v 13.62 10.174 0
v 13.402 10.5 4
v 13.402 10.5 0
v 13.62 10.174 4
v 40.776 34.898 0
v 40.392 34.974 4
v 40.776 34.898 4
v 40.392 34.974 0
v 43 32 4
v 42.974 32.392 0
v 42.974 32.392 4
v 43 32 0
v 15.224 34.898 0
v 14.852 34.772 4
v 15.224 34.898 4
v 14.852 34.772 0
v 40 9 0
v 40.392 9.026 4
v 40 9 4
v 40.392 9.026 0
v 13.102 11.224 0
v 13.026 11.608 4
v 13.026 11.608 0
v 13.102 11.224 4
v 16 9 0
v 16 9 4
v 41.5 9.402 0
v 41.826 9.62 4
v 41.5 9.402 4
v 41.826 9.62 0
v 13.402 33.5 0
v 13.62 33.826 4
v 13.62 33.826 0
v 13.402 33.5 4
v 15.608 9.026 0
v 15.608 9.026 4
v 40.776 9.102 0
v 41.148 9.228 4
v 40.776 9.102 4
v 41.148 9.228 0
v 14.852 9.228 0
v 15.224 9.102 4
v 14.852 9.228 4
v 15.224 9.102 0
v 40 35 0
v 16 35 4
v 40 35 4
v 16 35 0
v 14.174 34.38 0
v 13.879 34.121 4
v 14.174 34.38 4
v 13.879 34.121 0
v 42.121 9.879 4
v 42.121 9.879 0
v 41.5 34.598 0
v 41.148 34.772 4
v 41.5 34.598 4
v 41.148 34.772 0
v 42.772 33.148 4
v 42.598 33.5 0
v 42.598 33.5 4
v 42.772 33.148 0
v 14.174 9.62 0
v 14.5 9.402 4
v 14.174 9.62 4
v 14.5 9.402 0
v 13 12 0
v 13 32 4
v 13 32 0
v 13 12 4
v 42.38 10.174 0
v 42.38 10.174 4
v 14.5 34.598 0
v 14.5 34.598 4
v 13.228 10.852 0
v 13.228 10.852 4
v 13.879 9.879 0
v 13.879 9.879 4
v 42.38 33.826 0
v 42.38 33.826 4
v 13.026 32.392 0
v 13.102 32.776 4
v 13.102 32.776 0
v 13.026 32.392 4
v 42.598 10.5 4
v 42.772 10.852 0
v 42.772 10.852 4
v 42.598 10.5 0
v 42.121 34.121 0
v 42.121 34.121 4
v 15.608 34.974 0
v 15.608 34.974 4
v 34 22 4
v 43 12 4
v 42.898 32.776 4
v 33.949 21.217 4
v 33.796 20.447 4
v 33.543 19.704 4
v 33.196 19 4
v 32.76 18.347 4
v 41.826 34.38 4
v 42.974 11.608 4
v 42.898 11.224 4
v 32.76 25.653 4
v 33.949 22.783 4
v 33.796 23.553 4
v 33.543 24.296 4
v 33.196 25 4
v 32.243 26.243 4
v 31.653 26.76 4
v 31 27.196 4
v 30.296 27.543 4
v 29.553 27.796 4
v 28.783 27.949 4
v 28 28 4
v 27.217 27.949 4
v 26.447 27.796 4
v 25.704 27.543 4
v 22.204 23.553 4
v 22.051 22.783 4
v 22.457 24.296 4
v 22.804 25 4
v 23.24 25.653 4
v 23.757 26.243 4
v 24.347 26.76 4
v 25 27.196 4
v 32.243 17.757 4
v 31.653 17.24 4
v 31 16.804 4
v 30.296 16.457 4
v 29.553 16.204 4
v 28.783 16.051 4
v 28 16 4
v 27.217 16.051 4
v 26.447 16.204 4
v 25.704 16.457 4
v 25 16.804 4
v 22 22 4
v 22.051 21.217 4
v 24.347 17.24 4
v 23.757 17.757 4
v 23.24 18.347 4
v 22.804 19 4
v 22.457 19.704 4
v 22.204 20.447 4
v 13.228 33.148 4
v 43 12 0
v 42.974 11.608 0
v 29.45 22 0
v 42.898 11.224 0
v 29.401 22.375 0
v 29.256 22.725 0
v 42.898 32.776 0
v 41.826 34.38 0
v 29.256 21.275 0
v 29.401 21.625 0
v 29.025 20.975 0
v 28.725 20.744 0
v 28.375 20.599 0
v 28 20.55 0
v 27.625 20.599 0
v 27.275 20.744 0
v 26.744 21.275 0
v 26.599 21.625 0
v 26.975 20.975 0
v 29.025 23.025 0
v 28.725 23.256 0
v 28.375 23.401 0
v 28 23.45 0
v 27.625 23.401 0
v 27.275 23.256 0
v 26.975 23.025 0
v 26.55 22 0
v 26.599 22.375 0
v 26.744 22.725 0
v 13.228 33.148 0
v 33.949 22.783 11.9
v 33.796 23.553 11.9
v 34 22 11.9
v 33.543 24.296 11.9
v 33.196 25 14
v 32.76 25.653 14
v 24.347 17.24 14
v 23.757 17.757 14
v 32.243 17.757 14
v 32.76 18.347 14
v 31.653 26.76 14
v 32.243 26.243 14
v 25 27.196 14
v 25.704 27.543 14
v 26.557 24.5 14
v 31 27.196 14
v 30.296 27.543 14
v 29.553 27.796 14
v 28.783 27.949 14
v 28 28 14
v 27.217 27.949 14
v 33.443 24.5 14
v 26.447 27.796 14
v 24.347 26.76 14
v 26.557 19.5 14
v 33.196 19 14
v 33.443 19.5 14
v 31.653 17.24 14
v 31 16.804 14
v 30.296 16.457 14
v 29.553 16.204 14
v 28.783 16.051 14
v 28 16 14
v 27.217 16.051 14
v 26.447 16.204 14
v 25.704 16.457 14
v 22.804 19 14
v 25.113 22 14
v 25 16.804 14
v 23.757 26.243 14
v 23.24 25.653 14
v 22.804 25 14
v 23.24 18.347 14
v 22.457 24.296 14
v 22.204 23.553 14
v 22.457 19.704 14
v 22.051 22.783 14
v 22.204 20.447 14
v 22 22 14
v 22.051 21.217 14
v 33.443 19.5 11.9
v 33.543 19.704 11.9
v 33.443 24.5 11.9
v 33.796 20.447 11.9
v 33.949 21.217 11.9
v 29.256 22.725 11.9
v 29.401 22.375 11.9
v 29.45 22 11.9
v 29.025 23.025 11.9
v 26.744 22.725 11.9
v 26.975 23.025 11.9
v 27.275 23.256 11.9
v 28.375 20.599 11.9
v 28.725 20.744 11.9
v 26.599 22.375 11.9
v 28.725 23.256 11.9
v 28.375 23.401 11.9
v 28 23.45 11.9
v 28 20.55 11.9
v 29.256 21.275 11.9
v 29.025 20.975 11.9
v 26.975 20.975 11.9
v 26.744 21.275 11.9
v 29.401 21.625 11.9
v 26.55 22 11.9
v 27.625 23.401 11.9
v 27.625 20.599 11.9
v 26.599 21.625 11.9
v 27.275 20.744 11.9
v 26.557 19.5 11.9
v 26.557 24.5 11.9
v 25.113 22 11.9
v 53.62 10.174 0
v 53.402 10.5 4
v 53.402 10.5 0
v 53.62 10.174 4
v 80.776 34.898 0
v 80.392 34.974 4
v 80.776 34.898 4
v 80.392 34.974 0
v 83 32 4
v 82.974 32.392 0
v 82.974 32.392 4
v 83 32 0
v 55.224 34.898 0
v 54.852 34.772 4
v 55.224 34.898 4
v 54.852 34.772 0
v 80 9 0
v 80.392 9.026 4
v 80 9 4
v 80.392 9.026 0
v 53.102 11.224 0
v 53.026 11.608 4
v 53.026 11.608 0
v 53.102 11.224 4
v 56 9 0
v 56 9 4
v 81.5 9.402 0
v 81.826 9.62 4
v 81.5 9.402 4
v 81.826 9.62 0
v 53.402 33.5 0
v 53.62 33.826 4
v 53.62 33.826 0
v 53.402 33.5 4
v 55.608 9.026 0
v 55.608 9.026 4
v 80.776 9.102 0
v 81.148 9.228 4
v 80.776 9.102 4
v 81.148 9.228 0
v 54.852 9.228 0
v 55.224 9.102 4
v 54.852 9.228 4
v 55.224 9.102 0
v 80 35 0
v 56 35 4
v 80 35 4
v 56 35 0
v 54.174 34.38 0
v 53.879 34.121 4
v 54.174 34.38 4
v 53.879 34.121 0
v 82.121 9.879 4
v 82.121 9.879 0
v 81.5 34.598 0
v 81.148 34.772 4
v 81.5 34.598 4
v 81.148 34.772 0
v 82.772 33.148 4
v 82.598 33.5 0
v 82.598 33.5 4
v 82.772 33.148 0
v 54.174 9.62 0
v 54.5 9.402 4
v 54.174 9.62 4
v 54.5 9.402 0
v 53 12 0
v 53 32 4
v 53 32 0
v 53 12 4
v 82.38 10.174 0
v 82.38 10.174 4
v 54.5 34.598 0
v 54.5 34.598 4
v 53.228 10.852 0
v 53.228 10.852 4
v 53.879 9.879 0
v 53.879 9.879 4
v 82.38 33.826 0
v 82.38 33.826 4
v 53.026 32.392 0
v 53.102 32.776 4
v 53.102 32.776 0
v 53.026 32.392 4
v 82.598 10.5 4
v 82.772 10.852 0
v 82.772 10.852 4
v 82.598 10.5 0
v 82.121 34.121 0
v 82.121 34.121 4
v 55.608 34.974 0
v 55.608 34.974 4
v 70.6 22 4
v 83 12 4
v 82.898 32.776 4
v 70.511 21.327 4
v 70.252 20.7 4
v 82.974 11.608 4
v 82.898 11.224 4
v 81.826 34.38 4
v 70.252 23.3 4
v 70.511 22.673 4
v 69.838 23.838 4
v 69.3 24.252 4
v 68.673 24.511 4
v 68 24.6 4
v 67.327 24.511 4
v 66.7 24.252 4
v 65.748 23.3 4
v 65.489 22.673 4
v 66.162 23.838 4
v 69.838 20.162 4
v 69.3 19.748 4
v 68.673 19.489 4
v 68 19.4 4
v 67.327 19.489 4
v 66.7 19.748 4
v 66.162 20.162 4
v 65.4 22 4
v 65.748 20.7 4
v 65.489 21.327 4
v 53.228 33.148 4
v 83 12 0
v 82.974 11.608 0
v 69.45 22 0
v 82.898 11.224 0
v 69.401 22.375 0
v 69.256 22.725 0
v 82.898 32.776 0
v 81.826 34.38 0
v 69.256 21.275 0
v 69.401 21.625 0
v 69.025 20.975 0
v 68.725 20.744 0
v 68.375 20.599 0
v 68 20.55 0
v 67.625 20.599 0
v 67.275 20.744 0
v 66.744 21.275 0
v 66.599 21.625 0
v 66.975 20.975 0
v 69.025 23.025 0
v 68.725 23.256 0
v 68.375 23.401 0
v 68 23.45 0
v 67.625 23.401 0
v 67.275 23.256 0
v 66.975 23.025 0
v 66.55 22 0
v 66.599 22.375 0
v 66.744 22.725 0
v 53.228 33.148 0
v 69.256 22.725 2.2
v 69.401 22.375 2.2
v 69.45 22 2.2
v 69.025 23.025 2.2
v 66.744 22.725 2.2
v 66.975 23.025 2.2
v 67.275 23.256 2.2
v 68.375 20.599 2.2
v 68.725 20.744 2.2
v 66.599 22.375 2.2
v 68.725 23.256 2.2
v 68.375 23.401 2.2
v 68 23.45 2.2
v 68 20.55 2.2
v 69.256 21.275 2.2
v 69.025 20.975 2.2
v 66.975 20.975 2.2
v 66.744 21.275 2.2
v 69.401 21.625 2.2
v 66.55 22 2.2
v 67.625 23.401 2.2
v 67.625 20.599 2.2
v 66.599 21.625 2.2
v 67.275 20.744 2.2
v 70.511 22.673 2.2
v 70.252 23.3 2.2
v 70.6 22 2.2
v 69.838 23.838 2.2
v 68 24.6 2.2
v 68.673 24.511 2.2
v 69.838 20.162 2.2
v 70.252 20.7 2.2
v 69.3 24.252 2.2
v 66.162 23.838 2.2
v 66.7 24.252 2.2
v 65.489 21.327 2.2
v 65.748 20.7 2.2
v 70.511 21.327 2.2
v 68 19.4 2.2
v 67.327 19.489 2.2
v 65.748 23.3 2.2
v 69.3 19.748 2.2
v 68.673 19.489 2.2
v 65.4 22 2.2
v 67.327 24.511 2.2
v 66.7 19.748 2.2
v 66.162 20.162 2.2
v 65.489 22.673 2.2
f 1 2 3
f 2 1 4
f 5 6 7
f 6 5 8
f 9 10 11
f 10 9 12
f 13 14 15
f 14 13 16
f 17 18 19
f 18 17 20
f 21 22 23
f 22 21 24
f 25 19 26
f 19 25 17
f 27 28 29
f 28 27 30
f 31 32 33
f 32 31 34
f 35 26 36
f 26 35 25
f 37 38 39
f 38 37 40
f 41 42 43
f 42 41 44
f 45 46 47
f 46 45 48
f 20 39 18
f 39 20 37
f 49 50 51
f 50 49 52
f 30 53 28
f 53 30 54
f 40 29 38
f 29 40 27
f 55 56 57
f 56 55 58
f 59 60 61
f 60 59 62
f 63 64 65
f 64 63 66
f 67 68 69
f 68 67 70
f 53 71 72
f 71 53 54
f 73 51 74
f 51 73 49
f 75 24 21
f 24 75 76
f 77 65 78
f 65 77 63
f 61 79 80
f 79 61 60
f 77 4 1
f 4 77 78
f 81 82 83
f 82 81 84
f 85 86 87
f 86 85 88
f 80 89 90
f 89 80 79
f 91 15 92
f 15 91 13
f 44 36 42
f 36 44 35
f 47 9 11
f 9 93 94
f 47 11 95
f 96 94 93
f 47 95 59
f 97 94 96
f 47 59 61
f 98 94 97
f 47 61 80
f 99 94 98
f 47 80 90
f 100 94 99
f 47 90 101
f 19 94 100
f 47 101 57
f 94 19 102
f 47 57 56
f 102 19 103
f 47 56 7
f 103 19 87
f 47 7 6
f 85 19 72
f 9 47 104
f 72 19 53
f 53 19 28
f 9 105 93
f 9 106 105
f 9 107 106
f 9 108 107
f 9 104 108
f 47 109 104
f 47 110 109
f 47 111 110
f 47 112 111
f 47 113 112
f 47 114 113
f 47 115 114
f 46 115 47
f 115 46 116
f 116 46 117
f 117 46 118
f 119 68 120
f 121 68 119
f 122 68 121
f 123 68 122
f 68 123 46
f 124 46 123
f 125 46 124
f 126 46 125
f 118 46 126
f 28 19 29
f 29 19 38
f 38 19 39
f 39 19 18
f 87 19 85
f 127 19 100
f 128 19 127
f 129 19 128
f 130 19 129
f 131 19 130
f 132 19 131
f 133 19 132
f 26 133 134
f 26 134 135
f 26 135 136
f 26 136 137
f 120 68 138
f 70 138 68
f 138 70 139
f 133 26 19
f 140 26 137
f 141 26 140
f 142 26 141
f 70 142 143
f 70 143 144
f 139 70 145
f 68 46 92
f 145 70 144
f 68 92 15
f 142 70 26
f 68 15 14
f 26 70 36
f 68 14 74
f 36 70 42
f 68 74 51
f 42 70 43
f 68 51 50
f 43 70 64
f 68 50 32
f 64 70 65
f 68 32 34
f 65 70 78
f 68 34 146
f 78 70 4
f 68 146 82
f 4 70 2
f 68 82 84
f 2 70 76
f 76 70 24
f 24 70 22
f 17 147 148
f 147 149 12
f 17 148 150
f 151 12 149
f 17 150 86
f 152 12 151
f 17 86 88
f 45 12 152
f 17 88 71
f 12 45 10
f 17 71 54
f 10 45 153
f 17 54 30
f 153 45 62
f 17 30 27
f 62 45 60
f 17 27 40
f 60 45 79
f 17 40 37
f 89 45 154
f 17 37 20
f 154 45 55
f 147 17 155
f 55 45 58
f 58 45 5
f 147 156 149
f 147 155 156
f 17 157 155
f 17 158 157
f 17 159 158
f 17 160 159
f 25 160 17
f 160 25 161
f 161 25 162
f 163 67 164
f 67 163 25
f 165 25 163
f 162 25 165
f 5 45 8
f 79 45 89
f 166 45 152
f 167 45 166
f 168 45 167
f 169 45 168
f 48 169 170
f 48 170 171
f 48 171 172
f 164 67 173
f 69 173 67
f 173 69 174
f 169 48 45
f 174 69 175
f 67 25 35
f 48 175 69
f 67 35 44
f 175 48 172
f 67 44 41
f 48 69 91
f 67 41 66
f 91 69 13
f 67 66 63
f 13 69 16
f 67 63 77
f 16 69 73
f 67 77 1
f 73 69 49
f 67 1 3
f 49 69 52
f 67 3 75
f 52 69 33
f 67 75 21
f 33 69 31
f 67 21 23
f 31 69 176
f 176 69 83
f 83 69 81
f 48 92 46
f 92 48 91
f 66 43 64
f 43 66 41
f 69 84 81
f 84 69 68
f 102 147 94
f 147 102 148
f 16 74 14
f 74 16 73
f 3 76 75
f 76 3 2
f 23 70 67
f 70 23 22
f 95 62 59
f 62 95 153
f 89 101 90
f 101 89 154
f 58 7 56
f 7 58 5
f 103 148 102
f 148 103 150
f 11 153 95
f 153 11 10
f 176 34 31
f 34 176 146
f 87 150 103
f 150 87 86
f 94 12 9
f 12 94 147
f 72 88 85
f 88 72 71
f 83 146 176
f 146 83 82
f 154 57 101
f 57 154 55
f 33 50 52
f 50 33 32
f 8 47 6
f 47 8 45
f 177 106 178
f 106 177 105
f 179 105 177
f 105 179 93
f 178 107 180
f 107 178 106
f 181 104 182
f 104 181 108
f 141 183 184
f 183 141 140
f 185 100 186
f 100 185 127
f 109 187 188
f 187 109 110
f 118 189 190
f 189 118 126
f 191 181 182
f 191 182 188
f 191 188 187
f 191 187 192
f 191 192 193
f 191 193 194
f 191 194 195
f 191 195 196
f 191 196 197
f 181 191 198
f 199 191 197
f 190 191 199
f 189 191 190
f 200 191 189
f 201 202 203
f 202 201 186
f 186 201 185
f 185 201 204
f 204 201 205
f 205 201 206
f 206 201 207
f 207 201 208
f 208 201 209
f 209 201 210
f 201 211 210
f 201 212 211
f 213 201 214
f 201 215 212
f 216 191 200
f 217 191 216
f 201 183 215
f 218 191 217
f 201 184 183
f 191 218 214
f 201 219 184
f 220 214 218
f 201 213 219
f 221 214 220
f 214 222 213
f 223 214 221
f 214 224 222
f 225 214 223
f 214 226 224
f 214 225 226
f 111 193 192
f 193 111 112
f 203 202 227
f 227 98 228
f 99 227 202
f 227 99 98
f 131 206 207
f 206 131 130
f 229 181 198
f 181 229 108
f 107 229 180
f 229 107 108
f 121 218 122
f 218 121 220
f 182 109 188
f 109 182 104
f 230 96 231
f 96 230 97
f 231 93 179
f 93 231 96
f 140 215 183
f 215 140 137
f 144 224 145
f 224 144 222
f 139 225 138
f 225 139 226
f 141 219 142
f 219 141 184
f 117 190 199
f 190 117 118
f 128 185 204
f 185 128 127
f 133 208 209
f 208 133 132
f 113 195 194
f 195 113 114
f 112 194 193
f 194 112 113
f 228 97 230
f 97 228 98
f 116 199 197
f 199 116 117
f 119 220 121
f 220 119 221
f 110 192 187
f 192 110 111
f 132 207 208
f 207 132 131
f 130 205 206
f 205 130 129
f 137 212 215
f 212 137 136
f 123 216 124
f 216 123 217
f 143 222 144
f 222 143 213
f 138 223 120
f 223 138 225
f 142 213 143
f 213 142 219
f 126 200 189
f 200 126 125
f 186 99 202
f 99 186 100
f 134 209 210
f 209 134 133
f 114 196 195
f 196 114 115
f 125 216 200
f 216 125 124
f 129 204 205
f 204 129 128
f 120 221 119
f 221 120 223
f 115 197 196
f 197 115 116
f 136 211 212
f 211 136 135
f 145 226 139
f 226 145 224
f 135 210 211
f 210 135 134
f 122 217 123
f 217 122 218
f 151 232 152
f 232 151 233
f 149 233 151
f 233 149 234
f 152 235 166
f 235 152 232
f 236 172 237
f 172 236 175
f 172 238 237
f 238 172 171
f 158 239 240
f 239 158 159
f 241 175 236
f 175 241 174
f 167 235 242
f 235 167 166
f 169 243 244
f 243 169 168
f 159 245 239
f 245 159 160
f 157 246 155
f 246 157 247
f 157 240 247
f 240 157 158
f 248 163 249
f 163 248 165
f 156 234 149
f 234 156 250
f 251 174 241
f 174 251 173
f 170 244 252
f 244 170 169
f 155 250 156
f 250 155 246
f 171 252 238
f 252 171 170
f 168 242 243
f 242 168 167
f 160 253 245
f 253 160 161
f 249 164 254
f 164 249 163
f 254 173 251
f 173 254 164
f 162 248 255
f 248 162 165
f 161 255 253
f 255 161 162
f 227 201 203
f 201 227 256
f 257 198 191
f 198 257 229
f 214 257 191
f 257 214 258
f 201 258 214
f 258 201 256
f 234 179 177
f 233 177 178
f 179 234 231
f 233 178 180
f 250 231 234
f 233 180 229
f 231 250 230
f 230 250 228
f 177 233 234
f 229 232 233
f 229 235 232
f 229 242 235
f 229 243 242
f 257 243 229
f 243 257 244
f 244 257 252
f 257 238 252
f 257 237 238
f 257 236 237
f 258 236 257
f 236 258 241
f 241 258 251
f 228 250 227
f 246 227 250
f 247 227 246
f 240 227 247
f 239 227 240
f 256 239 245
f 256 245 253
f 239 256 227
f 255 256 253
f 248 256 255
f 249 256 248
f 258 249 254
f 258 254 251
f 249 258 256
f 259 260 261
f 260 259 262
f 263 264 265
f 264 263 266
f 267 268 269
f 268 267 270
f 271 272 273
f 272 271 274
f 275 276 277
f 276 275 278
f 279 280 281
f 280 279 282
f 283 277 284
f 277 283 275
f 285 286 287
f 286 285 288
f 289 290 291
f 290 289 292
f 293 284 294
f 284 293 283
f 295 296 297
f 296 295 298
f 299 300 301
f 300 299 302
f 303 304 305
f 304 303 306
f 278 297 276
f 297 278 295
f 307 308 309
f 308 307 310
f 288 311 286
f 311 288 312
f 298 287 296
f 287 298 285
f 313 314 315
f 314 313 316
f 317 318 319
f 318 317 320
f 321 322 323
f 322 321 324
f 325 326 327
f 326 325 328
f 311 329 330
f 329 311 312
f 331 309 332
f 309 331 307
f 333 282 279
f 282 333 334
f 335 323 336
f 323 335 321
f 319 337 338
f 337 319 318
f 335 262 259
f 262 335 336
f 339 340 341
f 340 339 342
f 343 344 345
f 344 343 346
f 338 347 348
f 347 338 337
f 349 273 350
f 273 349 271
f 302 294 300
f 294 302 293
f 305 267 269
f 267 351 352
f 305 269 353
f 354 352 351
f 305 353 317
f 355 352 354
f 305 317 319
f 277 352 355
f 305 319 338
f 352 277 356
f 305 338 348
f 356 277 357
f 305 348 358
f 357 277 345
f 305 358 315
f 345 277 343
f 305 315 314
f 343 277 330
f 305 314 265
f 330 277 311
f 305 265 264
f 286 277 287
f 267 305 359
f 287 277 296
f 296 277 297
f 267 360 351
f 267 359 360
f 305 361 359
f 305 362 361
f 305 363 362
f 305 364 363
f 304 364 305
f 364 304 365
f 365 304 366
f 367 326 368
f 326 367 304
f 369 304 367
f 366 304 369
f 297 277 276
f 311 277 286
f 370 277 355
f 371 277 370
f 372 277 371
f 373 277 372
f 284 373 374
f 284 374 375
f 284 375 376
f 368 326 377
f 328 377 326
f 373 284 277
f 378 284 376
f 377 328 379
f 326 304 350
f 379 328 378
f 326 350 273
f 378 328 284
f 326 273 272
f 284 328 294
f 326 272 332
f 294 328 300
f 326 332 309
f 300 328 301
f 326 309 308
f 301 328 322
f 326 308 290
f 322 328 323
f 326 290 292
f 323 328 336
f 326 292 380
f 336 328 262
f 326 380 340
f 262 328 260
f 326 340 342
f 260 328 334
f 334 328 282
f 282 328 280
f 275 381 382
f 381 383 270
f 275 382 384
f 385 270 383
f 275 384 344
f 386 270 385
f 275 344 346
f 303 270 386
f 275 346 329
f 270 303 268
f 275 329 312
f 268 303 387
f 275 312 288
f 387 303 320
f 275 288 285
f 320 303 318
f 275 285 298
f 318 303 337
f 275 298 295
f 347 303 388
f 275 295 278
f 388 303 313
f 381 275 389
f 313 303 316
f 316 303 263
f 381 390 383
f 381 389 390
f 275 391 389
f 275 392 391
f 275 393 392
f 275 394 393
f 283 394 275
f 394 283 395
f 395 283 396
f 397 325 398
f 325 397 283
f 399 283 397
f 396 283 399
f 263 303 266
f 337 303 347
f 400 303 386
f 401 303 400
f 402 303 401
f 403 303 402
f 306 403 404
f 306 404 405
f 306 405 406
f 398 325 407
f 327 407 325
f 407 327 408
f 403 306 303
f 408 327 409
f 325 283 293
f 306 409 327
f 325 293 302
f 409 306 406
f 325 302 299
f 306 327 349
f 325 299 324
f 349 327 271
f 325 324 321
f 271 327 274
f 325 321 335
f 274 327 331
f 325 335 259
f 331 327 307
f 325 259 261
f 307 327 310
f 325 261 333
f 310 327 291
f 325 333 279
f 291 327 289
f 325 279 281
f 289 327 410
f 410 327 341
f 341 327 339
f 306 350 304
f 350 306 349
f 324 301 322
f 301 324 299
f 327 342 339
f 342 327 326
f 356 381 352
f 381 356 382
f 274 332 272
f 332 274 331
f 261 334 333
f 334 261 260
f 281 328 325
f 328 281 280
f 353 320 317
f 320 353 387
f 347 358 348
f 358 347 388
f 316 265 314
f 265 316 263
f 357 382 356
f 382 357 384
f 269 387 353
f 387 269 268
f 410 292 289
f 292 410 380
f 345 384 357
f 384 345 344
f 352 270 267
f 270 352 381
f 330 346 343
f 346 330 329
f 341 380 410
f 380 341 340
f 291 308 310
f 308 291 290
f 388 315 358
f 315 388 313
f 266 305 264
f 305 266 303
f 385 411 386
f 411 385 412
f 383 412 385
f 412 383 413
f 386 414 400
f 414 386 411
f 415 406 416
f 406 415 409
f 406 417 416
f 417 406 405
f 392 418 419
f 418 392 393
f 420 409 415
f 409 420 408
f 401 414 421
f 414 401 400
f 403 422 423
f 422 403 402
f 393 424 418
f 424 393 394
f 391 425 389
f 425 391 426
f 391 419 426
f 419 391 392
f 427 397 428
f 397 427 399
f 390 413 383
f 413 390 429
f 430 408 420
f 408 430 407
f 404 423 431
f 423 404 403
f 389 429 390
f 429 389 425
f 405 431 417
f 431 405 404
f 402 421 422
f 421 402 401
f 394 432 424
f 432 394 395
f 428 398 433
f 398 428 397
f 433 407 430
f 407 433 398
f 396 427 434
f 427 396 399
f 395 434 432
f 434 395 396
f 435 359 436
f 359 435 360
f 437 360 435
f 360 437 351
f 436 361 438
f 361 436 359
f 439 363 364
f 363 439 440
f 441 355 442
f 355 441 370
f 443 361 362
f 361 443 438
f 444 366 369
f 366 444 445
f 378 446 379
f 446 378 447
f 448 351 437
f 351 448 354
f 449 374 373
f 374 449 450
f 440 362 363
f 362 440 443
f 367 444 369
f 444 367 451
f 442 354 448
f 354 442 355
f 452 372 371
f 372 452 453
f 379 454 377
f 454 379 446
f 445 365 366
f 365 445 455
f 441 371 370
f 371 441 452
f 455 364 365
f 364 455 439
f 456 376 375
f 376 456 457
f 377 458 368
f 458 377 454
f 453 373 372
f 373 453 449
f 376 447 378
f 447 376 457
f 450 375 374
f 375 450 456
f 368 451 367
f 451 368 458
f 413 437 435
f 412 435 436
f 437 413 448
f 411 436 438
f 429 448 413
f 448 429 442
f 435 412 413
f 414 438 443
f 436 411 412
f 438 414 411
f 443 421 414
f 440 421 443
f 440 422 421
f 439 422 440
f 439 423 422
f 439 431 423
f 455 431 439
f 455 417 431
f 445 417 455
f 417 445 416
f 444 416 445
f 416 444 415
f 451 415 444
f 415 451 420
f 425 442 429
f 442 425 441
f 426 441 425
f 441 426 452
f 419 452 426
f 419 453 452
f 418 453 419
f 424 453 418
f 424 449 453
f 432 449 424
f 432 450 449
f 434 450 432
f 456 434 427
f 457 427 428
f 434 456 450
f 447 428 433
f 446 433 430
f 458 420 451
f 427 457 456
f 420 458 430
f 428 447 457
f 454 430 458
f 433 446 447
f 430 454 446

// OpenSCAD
/*
Sample 057: Schraubdom mit seitlicher Muttertasche — M2,5
Generated from the FDM Mechanical Sample Library.
Units: millimetres.

Override examples:
  openscad -o custom.stl -D 'view="plate"' -D 'render_fn=64' model.scad
  openscad -o preview.png -D 'view="assembly"' model.scad
*/
use <../../../library/fdm_mechanisms.scad>

render_fn = is_undef(render_fn) ? 48 : render_fn;
view = is_undef(view) ? "plate" : view;
$fn = render_fn;

sample_nuttrap_screw(
    view=view,
    screw_d=2.9,
    nut_flat=5,
    nut_h=2.1,
    head_d=5.2
);
